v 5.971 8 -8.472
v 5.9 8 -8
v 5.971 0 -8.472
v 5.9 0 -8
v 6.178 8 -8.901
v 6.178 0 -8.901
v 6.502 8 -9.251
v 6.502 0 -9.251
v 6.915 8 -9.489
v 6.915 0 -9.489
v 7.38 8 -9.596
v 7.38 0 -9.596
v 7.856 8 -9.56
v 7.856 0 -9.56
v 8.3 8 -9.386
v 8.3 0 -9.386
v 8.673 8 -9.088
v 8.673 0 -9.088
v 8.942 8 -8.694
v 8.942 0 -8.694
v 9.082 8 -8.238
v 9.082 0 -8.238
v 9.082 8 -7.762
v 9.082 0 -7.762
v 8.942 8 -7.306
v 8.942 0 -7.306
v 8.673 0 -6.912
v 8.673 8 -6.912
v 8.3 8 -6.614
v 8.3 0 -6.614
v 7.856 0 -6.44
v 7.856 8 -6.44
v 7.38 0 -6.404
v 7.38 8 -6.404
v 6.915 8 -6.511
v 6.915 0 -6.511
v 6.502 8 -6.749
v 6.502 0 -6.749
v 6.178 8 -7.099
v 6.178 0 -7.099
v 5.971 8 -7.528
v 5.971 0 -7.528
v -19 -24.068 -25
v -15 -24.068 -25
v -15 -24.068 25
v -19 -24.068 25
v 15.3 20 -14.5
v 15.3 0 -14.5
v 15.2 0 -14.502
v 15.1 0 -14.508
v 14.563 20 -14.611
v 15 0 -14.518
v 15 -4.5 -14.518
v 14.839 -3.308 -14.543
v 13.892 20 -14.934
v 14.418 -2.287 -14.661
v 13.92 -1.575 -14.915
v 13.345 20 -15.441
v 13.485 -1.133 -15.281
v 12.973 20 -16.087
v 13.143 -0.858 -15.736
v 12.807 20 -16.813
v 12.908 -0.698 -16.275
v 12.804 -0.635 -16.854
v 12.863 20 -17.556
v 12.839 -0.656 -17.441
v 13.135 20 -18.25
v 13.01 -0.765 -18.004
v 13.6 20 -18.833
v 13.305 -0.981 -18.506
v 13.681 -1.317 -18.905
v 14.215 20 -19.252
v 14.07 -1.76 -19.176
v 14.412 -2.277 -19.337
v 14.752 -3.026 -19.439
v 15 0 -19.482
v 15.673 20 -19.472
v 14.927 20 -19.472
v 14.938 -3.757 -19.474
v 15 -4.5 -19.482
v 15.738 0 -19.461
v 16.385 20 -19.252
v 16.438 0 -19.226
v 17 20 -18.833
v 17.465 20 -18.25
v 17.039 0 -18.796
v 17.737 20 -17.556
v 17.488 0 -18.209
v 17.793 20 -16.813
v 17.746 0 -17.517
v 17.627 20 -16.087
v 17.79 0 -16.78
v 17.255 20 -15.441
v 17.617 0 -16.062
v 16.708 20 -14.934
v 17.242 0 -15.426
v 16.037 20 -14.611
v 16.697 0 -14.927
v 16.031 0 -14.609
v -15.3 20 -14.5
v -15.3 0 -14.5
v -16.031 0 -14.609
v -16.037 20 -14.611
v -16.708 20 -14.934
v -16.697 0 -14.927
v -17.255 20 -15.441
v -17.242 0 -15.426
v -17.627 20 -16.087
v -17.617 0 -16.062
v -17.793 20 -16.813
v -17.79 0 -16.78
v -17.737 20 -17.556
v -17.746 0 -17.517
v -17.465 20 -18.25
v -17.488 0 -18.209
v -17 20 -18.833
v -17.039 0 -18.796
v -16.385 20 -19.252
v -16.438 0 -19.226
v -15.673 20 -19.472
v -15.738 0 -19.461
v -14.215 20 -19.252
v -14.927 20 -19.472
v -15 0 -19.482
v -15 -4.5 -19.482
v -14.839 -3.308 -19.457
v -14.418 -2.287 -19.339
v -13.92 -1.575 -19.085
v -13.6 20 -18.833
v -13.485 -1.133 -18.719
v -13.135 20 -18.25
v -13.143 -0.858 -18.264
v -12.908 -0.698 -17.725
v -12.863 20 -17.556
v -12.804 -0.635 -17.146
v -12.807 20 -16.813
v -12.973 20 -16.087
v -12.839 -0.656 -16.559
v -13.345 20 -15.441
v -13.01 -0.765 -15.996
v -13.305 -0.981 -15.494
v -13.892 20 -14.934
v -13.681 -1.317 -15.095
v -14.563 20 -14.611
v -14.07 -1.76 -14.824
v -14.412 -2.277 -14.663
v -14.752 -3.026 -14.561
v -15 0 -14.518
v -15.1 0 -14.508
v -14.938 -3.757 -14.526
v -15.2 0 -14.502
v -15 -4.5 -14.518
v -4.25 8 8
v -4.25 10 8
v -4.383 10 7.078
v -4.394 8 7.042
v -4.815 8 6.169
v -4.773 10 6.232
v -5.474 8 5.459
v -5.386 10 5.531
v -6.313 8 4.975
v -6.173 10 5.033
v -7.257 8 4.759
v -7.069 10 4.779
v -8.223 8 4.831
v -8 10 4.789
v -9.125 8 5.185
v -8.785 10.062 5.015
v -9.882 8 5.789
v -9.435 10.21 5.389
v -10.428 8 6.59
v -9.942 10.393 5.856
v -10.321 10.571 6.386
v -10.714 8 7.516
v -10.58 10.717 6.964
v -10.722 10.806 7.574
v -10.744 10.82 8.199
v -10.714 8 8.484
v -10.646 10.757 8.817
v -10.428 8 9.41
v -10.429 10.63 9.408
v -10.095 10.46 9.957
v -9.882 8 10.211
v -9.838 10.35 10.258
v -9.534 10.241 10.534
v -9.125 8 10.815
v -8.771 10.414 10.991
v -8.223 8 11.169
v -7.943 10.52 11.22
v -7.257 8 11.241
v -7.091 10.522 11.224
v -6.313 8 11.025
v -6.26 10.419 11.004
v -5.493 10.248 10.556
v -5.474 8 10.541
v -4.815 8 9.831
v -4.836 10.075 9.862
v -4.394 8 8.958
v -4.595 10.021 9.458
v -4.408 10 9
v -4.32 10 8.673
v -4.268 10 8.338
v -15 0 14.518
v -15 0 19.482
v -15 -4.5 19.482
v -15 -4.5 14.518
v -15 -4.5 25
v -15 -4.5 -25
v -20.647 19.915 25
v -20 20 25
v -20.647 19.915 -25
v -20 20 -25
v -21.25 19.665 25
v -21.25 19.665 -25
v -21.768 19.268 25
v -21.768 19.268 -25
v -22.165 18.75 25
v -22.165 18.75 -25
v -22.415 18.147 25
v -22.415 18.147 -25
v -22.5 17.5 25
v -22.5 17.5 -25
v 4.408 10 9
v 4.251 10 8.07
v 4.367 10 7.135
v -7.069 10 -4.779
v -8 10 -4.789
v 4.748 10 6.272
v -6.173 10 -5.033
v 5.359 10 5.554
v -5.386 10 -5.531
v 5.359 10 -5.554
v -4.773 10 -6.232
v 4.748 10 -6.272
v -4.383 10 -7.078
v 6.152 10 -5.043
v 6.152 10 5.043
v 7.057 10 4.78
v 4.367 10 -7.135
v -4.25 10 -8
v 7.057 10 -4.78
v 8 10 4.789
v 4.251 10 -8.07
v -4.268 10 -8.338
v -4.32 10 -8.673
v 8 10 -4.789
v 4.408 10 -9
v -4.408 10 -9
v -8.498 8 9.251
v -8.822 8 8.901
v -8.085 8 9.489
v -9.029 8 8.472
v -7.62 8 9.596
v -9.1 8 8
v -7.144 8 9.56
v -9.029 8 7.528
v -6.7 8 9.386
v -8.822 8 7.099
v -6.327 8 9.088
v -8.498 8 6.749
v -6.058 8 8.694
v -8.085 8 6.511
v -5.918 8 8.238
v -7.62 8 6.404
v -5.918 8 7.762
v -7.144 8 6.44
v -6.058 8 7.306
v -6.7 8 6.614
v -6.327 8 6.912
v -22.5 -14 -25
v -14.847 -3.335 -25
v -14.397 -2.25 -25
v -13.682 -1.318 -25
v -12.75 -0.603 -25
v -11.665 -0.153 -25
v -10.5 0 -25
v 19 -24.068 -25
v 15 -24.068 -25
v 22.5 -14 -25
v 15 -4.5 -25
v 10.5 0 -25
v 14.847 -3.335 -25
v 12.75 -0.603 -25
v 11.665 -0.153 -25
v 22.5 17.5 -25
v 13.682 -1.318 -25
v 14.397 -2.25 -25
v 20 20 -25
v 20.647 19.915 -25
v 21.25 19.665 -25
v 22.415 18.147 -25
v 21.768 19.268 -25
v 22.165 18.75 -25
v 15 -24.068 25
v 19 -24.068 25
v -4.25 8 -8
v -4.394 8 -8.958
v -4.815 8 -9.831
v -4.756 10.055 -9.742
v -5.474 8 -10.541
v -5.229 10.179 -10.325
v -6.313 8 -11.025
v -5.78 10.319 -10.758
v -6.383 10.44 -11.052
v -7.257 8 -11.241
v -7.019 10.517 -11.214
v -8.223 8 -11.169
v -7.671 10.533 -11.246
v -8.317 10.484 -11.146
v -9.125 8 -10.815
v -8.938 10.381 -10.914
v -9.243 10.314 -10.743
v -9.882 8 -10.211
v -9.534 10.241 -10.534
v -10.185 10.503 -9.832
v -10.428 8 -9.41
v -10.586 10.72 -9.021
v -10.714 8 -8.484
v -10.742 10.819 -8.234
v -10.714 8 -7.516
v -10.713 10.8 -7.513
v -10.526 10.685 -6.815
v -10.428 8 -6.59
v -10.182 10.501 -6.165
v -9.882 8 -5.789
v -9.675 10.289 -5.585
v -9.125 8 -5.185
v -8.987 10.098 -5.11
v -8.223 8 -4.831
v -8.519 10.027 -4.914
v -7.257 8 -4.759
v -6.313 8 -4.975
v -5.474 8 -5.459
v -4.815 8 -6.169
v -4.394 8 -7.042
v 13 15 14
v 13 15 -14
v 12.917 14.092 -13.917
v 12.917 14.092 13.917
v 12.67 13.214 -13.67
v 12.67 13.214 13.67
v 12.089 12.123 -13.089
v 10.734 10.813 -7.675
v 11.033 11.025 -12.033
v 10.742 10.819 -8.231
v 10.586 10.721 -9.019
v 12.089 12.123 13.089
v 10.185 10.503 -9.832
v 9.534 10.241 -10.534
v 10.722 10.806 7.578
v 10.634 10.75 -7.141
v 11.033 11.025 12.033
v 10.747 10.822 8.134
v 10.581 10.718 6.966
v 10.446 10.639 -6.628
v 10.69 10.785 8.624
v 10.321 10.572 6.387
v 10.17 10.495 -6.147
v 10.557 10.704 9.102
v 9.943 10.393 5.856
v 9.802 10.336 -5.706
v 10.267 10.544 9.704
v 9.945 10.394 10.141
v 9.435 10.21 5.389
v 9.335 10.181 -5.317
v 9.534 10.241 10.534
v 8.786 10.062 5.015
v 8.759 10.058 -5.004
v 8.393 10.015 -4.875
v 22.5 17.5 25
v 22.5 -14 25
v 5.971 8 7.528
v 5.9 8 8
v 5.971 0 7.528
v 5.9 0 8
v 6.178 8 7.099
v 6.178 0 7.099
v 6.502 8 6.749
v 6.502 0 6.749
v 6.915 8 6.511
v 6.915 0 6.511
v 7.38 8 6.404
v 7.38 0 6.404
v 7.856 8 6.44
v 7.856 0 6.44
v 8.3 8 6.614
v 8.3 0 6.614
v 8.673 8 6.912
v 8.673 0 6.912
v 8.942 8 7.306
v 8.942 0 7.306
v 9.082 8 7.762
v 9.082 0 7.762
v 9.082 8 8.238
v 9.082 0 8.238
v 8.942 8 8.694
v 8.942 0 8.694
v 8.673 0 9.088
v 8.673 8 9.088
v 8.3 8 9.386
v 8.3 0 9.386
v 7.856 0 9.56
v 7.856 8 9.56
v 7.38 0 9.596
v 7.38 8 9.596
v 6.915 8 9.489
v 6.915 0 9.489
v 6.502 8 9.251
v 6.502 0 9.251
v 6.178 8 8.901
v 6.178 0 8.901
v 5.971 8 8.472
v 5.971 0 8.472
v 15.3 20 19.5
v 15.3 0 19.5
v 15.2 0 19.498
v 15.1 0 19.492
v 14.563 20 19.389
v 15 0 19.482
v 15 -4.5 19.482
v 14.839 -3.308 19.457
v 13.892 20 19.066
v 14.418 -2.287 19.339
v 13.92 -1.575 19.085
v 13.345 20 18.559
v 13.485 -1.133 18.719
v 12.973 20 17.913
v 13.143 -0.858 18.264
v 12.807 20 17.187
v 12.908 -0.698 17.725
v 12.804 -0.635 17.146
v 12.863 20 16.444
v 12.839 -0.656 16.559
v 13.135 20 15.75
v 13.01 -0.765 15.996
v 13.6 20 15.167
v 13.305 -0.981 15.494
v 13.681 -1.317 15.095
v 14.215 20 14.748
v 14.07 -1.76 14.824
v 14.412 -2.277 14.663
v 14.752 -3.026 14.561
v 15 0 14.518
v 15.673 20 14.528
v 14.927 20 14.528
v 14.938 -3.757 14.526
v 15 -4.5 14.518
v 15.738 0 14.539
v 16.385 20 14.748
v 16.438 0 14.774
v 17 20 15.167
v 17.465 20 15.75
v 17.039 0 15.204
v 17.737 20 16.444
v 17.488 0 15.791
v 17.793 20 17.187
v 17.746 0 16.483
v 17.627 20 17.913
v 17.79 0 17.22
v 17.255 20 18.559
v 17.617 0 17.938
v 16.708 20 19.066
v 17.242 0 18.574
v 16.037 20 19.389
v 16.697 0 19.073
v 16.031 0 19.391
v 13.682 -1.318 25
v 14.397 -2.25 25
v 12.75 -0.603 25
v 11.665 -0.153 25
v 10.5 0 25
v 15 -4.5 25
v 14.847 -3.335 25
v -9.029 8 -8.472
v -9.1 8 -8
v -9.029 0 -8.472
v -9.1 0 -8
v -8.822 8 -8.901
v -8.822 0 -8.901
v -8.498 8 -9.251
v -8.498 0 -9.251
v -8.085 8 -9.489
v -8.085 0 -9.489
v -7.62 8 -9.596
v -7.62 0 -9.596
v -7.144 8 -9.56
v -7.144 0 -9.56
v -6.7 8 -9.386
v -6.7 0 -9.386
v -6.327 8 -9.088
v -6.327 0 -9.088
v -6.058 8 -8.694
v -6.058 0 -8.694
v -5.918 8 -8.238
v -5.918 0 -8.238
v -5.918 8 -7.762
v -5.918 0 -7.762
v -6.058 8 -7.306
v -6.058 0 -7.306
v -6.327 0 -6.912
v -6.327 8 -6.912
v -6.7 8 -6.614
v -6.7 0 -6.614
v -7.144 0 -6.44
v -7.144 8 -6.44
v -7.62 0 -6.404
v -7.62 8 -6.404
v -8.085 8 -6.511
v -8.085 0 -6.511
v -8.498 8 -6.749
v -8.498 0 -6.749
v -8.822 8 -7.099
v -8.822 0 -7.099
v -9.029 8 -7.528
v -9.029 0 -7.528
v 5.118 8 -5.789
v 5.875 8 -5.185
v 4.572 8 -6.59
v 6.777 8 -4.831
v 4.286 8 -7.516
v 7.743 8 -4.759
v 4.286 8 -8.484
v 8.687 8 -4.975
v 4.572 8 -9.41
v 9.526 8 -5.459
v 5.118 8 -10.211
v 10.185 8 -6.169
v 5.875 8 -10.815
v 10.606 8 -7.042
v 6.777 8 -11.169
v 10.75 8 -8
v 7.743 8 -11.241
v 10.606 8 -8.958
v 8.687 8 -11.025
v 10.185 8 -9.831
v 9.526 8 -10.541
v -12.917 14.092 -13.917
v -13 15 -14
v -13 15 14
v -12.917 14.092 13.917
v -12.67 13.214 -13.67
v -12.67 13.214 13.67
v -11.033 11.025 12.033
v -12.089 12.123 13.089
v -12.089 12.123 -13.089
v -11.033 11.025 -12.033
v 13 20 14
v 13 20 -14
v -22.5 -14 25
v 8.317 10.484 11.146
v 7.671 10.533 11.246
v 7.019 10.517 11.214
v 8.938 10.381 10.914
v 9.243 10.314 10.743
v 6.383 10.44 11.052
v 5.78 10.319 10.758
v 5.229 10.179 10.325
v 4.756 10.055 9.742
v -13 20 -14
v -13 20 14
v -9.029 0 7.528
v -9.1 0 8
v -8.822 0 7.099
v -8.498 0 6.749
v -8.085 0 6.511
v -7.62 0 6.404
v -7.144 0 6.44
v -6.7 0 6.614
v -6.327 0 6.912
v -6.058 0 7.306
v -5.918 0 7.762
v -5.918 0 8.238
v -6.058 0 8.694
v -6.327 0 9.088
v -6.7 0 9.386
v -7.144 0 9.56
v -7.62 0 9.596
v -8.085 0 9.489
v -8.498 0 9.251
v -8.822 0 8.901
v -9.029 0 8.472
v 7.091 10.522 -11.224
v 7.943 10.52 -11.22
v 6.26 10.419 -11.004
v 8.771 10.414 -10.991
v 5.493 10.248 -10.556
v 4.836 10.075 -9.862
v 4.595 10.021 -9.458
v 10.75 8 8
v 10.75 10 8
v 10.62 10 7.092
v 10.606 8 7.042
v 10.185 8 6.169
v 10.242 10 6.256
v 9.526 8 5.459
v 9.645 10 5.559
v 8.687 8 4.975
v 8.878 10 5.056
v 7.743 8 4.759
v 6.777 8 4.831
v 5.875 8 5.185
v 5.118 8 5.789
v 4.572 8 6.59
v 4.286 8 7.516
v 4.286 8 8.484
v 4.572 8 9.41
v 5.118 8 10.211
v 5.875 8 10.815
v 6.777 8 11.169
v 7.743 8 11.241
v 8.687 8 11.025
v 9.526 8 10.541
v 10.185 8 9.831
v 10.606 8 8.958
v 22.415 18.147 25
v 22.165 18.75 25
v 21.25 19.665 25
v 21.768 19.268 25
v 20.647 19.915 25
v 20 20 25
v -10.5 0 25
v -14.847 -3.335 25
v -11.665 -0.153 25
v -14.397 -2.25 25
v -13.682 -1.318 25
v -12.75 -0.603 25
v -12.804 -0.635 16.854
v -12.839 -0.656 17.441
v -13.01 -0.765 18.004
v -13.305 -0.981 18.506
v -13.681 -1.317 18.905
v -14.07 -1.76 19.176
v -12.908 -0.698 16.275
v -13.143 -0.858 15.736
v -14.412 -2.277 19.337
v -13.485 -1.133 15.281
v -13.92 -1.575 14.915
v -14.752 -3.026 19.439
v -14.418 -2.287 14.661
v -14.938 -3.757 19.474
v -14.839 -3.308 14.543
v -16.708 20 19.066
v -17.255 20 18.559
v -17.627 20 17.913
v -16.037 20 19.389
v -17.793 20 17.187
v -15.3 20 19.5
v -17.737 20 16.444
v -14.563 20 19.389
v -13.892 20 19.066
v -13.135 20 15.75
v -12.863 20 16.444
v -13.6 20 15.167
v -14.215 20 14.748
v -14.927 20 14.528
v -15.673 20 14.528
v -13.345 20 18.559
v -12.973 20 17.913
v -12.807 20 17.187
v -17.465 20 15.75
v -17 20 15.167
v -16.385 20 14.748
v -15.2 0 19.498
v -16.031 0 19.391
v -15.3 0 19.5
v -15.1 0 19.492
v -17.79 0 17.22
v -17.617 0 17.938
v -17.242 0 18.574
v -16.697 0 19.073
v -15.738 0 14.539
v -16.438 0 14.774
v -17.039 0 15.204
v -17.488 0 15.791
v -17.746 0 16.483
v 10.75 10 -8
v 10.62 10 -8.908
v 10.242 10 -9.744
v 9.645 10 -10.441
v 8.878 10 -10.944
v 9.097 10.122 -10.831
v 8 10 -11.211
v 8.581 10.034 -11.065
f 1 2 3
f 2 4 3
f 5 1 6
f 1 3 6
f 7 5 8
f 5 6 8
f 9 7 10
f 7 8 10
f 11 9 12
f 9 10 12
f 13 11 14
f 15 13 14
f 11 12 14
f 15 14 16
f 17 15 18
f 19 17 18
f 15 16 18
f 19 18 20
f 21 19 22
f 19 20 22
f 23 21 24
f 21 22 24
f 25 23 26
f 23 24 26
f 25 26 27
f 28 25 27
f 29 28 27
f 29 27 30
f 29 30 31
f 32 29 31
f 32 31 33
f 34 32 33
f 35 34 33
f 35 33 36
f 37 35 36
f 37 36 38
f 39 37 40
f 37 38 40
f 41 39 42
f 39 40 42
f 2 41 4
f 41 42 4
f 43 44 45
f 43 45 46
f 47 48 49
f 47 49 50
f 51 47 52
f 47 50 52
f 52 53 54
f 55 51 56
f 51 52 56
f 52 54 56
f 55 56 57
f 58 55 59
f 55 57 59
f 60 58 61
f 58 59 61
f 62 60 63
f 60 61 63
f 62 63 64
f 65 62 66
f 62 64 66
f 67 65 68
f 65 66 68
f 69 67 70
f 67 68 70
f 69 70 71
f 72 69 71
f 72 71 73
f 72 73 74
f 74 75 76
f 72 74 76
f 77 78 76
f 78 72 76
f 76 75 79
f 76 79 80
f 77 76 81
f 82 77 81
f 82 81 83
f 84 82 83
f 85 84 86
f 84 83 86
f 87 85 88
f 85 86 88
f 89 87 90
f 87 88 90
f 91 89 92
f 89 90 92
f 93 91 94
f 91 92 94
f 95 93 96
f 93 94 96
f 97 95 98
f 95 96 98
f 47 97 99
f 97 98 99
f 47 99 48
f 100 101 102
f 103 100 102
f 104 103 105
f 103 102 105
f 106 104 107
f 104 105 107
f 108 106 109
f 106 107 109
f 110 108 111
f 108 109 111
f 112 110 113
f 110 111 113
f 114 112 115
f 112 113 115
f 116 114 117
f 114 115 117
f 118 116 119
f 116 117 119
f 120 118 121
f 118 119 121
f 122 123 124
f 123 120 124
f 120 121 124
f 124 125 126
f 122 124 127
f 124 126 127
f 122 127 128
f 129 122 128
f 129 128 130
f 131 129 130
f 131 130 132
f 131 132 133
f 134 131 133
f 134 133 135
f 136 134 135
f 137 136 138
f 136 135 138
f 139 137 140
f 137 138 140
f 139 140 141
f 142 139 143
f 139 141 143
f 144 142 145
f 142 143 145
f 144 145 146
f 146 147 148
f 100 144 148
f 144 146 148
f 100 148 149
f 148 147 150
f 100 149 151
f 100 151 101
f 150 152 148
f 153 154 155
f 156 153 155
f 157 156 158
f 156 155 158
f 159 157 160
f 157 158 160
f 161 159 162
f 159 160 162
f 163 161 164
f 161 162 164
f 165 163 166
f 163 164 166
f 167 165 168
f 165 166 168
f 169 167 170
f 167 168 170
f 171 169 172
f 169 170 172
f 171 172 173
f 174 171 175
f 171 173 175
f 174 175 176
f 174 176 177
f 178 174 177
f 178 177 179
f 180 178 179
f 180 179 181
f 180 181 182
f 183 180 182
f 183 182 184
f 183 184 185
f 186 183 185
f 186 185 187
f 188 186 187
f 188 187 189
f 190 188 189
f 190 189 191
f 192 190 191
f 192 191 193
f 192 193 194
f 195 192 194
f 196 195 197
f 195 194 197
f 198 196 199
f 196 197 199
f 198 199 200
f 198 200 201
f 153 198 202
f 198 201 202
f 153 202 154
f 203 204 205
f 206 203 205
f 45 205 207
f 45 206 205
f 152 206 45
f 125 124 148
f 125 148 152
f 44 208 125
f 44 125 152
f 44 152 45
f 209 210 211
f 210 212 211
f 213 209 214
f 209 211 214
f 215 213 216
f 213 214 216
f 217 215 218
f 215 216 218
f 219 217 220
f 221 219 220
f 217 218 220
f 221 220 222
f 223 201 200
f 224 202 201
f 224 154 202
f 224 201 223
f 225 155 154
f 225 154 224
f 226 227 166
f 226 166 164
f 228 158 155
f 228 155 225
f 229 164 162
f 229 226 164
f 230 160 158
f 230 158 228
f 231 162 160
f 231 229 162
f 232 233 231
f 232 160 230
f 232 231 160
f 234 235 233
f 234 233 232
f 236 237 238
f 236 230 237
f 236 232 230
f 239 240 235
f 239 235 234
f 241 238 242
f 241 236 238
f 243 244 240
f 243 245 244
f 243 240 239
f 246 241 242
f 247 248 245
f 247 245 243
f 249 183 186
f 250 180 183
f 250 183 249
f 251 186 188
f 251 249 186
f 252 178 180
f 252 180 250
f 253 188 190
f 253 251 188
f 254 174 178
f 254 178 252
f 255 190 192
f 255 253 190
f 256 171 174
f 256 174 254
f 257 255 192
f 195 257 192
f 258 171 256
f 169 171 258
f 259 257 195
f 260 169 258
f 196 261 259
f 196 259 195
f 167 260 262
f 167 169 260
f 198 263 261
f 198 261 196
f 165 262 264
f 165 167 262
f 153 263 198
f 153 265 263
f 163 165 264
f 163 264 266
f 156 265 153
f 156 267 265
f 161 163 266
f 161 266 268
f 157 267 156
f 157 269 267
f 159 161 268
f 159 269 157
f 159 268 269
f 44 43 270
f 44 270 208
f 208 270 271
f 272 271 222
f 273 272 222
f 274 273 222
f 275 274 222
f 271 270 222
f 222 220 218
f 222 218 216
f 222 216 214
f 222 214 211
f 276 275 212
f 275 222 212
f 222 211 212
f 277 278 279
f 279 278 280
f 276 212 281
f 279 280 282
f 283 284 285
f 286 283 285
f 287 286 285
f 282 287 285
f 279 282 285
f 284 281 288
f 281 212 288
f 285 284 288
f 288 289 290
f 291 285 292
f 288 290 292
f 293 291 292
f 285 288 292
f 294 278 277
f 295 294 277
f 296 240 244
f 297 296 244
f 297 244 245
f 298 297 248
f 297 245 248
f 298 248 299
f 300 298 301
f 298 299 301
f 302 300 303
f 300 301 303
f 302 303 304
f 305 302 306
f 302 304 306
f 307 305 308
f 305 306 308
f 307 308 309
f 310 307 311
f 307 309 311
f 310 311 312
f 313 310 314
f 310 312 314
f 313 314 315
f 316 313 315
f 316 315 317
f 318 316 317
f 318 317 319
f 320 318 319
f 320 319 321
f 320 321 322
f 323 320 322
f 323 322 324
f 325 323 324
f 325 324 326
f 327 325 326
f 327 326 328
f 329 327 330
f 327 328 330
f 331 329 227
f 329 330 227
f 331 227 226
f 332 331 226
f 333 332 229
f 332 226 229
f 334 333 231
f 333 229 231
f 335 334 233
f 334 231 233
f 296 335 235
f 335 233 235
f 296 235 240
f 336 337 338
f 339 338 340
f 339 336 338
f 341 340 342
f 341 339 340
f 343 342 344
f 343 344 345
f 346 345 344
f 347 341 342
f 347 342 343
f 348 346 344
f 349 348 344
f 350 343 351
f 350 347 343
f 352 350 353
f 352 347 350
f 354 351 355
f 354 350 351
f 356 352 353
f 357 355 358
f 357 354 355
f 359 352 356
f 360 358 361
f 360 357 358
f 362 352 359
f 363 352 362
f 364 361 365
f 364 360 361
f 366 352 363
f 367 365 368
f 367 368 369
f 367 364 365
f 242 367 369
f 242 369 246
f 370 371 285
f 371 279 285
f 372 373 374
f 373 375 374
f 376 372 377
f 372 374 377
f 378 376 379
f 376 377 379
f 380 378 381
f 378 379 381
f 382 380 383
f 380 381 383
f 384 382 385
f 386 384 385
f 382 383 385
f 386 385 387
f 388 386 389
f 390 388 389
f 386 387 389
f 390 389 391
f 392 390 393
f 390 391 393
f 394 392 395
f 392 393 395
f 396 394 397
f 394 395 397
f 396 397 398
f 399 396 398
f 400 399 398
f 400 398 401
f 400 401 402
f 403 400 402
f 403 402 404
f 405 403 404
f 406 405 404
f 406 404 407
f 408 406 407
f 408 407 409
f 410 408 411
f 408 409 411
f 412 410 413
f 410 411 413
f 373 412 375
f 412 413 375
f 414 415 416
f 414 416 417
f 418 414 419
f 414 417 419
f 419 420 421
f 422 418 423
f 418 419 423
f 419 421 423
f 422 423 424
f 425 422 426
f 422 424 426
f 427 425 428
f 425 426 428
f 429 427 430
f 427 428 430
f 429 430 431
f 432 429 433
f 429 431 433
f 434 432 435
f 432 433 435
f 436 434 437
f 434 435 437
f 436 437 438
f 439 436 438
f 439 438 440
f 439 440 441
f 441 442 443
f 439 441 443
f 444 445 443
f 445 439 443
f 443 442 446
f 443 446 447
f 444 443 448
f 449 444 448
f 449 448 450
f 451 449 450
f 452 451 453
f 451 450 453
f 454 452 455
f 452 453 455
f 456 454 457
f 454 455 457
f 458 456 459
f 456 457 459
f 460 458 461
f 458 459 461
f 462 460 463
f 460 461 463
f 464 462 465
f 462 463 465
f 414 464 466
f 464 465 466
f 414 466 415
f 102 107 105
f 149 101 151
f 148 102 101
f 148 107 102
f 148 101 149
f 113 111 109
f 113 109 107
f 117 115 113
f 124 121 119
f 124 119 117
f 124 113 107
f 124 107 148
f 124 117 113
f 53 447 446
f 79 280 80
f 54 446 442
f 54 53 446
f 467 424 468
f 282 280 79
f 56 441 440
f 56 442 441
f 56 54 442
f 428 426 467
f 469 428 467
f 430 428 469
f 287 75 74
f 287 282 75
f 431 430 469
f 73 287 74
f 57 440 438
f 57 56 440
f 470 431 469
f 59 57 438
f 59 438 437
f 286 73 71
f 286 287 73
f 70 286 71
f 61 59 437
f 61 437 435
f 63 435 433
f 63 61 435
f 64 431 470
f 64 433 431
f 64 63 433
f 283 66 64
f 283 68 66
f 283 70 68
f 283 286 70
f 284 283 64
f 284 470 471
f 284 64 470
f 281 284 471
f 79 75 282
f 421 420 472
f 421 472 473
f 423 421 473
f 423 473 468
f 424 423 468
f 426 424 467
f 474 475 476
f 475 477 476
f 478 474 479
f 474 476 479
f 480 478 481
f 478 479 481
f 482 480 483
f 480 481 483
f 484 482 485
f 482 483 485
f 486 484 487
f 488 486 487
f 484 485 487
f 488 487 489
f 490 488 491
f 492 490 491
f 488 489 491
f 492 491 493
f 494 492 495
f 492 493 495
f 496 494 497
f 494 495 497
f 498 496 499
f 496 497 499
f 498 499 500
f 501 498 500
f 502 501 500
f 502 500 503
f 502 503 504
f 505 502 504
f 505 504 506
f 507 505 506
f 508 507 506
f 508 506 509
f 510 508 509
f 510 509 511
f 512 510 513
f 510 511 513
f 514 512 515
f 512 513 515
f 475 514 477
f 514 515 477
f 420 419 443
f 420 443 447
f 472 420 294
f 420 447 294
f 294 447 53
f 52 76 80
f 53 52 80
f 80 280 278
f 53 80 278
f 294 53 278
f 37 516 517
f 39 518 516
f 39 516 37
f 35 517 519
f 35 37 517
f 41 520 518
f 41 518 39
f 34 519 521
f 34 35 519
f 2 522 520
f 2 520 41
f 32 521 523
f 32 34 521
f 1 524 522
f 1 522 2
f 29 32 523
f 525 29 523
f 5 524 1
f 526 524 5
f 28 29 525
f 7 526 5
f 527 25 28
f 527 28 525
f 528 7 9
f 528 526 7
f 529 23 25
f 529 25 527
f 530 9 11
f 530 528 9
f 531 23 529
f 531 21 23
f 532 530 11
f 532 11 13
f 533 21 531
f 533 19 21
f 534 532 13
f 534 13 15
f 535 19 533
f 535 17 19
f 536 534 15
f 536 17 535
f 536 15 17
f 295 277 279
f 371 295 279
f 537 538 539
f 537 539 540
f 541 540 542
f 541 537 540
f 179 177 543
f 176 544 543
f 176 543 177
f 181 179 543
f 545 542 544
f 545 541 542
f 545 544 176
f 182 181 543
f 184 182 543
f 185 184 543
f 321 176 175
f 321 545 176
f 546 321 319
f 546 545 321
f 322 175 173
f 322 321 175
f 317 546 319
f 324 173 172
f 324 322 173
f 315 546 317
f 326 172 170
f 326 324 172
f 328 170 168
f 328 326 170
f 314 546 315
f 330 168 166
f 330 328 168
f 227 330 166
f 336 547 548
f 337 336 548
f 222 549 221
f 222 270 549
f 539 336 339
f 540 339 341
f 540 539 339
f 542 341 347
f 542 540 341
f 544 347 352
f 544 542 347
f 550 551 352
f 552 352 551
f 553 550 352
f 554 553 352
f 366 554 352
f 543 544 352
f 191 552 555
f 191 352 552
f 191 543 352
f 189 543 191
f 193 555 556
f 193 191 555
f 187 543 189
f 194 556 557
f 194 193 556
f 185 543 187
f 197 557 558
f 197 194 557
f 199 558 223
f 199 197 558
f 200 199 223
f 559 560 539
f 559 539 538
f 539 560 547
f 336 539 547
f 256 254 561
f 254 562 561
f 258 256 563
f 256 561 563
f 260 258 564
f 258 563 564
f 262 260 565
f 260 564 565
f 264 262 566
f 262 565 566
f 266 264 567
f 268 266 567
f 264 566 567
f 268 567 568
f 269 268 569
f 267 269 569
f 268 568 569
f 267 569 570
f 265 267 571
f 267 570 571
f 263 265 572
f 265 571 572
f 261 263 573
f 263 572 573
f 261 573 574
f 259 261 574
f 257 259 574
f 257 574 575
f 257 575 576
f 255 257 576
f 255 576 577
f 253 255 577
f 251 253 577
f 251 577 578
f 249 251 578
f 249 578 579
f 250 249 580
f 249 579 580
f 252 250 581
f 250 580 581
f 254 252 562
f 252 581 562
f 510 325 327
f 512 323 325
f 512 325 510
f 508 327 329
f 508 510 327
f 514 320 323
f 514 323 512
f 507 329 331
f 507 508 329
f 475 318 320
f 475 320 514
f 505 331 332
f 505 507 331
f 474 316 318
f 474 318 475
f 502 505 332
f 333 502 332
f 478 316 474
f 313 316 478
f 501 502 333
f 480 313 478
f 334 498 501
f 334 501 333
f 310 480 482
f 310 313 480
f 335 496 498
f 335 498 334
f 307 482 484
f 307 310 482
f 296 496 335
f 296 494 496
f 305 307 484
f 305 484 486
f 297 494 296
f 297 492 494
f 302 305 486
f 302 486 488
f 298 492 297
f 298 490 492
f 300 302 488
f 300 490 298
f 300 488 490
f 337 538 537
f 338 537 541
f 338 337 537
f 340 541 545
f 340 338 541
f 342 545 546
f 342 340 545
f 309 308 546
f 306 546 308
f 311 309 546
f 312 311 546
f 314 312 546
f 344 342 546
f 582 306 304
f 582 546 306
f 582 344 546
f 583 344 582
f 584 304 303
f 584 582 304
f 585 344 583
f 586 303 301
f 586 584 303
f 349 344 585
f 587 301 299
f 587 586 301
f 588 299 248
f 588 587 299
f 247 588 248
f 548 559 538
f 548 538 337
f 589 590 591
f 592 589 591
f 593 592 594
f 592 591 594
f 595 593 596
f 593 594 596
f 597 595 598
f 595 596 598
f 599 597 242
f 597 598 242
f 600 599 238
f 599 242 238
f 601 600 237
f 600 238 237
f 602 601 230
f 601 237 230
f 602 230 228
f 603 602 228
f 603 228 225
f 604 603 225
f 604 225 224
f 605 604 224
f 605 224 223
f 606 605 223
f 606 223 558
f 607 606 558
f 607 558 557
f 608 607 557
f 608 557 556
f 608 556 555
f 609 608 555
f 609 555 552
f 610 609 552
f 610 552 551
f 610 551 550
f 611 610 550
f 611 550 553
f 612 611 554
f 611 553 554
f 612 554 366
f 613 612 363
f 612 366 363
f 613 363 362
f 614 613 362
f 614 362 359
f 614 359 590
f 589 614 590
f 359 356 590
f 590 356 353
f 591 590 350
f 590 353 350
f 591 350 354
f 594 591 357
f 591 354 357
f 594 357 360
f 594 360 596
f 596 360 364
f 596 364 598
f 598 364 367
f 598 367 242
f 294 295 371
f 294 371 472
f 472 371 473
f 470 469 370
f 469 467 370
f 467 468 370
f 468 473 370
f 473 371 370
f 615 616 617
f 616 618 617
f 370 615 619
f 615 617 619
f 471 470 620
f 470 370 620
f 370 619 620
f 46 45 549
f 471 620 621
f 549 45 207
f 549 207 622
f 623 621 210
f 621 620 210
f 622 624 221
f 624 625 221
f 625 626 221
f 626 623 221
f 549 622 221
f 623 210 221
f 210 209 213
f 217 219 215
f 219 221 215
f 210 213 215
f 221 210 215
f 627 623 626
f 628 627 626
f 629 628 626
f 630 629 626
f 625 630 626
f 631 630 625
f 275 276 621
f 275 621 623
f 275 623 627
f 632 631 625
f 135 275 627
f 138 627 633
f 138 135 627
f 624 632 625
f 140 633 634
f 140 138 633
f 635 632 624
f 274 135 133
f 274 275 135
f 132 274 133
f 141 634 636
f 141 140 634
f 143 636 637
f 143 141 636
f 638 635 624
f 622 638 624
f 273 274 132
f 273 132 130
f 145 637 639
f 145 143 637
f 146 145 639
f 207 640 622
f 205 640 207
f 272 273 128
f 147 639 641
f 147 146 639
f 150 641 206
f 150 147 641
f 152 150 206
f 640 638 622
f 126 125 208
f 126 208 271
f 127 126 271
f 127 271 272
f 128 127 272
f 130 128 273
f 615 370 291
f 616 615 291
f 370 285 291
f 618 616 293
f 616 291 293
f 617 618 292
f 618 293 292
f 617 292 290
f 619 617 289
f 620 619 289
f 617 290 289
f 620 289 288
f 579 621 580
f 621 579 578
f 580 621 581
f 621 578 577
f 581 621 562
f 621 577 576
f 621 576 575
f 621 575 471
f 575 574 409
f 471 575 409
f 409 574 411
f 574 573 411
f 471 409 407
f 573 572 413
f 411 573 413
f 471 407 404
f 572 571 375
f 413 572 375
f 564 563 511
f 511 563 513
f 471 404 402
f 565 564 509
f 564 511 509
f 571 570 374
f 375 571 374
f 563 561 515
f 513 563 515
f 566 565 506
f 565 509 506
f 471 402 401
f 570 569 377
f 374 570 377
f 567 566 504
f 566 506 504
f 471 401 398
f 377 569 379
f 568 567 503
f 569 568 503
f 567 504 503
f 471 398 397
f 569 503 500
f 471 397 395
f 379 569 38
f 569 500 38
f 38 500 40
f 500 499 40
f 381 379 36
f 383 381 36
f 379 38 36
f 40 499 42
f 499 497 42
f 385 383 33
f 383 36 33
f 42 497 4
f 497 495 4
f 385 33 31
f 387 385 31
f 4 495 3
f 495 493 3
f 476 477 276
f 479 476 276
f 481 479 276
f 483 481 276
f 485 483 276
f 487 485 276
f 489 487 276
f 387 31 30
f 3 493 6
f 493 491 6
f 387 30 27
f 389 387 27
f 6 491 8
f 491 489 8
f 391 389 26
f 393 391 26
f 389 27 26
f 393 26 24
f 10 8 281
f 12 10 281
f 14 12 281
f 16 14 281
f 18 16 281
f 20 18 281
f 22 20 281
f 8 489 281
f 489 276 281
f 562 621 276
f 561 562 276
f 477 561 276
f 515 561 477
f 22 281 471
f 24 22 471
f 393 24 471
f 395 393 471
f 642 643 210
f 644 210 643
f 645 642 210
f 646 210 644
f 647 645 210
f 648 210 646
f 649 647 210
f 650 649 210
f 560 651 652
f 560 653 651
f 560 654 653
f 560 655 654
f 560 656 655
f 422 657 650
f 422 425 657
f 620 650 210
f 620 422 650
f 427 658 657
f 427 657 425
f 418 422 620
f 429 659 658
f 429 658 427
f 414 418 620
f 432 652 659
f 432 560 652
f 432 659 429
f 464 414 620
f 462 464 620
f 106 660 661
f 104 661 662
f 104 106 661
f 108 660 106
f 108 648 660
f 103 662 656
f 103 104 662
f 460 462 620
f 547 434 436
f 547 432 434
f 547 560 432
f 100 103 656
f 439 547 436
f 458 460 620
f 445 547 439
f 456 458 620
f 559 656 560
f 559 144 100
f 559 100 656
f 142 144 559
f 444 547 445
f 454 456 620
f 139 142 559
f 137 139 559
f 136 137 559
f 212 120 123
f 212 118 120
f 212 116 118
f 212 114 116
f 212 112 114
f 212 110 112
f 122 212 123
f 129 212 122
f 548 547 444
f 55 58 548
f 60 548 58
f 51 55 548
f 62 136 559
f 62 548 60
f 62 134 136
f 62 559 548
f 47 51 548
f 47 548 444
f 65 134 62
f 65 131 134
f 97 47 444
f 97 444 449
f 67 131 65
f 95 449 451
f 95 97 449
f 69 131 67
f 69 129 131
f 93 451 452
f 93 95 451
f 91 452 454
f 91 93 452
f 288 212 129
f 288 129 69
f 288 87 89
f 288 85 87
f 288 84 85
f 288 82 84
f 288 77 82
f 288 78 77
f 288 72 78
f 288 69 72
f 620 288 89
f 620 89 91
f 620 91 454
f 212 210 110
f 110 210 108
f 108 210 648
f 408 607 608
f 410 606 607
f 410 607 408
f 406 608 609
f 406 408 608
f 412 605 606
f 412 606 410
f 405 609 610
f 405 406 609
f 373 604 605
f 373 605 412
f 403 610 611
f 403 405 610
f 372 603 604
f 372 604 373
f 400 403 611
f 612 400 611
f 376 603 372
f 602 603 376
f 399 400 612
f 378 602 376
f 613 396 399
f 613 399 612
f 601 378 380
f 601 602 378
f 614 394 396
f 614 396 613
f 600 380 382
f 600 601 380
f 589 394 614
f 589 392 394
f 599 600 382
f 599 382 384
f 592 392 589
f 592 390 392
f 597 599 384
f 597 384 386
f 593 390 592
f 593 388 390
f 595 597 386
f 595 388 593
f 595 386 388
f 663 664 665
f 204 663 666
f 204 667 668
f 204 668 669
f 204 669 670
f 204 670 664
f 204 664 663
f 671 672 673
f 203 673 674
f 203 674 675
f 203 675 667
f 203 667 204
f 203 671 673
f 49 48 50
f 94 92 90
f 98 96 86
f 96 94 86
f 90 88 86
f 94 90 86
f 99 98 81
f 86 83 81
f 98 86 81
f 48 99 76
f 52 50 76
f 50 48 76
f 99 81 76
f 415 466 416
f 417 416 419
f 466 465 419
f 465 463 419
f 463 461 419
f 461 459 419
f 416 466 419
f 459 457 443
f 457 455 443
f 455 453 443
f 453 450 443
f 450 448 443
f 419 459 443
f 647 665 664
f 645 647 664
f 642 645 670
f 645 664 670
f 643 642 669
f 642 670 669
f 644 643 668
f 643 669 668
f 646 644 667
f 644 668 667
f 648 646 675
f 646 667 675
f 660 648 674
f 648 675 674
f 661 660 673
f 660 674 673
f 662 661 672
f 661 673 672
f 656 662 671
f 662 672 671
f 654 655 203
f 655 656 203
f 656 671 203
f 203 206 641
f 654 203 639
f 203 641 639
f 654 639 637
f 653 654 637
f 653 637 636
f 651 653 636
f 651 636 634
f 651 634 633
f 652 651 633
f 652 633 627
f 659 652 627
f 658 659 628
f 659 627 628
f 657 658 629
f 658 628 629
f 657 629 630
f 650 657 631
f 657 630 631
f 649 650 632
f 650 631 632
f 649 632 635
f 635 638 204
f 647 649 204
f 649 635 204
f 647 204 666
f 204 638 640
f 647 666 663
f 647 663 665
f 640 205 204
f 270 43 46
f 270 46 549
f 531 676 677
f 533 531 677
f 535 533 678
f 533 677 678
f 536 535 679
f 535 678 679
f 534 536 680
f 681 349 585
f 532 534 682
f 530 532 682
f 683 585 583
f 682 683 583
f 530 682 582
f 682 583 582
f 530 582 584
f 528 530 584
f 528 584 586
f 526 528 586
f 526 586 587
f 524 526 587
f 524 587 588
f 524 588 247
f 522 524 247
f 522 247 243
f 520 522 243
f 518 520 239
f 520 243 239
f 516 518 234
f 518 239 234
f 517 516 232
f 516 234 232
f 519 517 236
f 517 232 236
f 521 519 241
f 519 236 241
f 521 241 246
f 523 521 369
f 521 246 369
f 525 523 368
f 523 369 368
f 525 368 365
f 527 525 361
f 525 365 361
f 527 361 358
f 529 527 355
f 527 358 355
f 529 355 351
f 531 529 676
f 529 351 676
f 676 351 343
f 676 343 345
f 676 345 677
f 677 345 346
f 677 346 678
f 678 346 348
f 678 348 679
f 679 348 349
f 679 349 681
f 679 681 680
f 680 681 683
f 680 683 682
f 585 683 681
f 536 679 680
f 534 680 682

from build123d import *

# Parameters (mm, degrees)
SKETCH1_W                                            = 45
SKETCH1_H                                            = 50
SKETCH1_R                                            = 1.5
SKETCH1_R_2                                          = 2.5
BOSS_EXTRUDE1_DEPTH                                  = 20
SKETCH3_W                                            = 26
SKETCH3_H                                            = 28
CUT_EXTRUDE1_DEPTH                                   = 10
REFRENTADO_PARA_TORNILLO_CON_CABEZA_PLAN_D           = 3.2
REFRENTADO_PARA_TORNILLO_CON_CABEZA_PLAN_CBORE_D     = 6.5
REFRENTADO_PARA_TORNILLO_CON_CABEZA_PLAN_CBORE_DEPTH = 2
FILLET4_R                                            = 5
BOSS_EXTRUDE4_DEPTH                                  = 50
FILLET5_R                                            = 4.5
FILLET6_R                                            = 2.5


with BuildPart() as part:
    # Sketch1 → Boss-Extrude1 (new body)
    with BuildSketch(Plane(origin=(0, 0, 0), x_dir=(1, 0, 0), z_dir=(0, 1, 0))):
        Rectangle(SKETCH1_W, SKETCH1_H)
        with Locations(Location((-7.5, 8, 0), (0, 0, 270))):
            Circle(SKETCH1_R, mode=Mode.SUBTRACT)
        with Locations(Location((7.5, 8, 0), (0, 0, 270))):
            Circle(SKETCH1_R, mode=Mode.SUBTRACT)
        with Locations(Location((7.5, -8, 0), (0, 0, 270))):
            Circle(SKETCH1_R, mode=Mode.SUBTRACT)
        with Locations(Location((-7.5, -8, 0), (0, 0, 270))):
            Circle(SKETCH1_R, mode=Mode.SUBTRACT)
        with Locations(Location((15.3, 17, 0), (0, 0, 270))):
            Circle(SKETCH1_R_2, mode=Mode.SUBTRACT)
        with Locations(Location((-15.3, 17, 0), (0, 0, 270))):
            Circle(SKETCH1_R_2, mode=Mode.SUBTRACT)
        with Locations(Location((-15.3, -17, 0), (0, 0, 270))):
            Circle(SKETCH1_R_2, mode=Mode.SUBTRACT)
        with Locations(Location((15.3, -17, 0), (0, 0, 270))):
            Circle(SKETCH1_R_2, mode=Mode.SUBTRACT)
    extrude(amount=BOSS_EXTRUDE1_DEPTH)

    # Sketch3 → Cut-Extrude1 (cut)
    with BuildSketch(Plane(origin=(0, 20, 0), x_dir=(1, 0, 0), z_dir=(0, 1, 0))):
        Rectangle(SKETCH3_W, SKETCH3_H)
    extrude(amount=-CUT_EXTRUDE1_DEPTH, mode=Mode.SUBTRACT)

    # Refrentado para tornillo con cabeza plana de M32 (through all)
    with Locations(Plane(origin=(0, 10, 0), x_dir=(1, 0, 0), z_dir=(0, 1, 0))):
        with Locations((-7.5, 8), (-7.5, -8), (7.5, -8), (7.5, 8)):
            CounterBoreHole(REFRENTADO_PARA_TORNILLO_CON_CABEZA_PLAN_D / 2, REFRENTADO_PARA_TORNILLO_CON_CABEZA_PLAN_CBORE_D / 2, REFRENTADO_PARA_TORNILLO_CON_CABEZA_PLAN_CBORE_DEPTH)

    # Fillet4
    # the kernel refuses this fillet: 5 mm, written as the material it adds along each edge
    with BuildSketch(Plane(origin=(13, 10, 14), x_dir=(0, 1, 0), z_dir=(0, 0, -1))) as fillet4_piece_1_section:
        with BuildLine():
            CenterArc((FILLET4_R, -FILLET4_R), FILLET4_R, 90, 90)
            Line((0, -FILLET4_R), (0, 0))
            Line((0, 0), (FILLET4_R, 0))
        make_face()
    fillet4_piece_1 = extrude(amount=28, mode=Mode.PRIVATE)
    fillet4_piece_1 = fillet4_piece_1 - Plane(origin=(7.5, 11.149497573, 8), x_dir=(1, 0, 0), z_dir=(0, 1, 0)) * Cylinder(3.25, 76, mode=Mode.PRIVATE)
    fillet4_piece_1 = fillet4_piece_1 - Plane(origin=(7.5, 11.149497573, -8), x_dir=(1, 0, 0), z_dir=(0, 1, 0)) * Cylinder(3.25, 76, mode=Mode.PRIVATE)
    add(fillet4_piece_1)
    with BuildSketch(Plane(origin=(-13, 10, 14), x_dir=(0, 1, 0), z_dir=(1, 0, 0))) as fillet4_piece_2_section:
        with BuildLine():
            CenterArc((FILLET4_R, -FILLET4_R), FILLET4_R, 90, 90)
            Line((0, -FILLET4_R), (0, 0))
            Line((0, 0), (FILLET4_R, 0))
        make_face()
    fillet4_piece_2 = extrude(amount=26, mode=Mode.PRIVATE)
    fillet4_piece_2 = fillet4_piece_2 - Plane(origin=(-7.5, 11.135296279, 8), x_dir=(1, 0, 0), z_dir=(0, 1, 0)) * Cylinder(3.25, 72, mode=Mode.PRIVATE)
    fillet4_piece_2 = fillet4_piece_2 - Plane(origin=(7.5, 11.135296279, 8), x_dir=(1, 0, 0), z_dir=(0, 1, 0)) * Cylinder(3.25, 72, mode=Mode.PRIVATE)
    add(fillet4_piece_2)
    with BuildSketch(Plane(origin=(-13, 10, -14), x_dir=(0, 1, 0), z_dir=(0, 0, 1))) as fillet4_piece_3_section:
        with BuildLine():
            CenterArc((FILLET4_R, -FILLET4_R), FILLET4_R, 90, 90)
            Line((0, -FILLET4_R), (0, 0))
            Line((0, 0), (FILLET4_R, 0))
        make_face()
    fillet4_piece_3 = extrude(amount=28, mode=Mode.PRIVATE)
    fillet4_piece_3 = fillet4_piece_3 - Plane(origin=(-7.5, 11.149494803, 8), x_dir=(1, 0, 0), z_dir=(0, 1, 0)) * Cylinder(3.25, 76, mode=Mode.PRIVATE)
    fillet4_piece_3 = fillet4_piece_3 - Plane(origin=(-7.5, 11.149494803, -8), x_dir=(1, 0, 0), z_dir=(0, 1, 0)) * Cylinder(3.25, 76, mode=Mode.PRIVATE)
    add(fillet4_piece_3)
    with BuildSketch(Plane(origin=(13, 10, -14), x_dir=(0, 1, 0), z_dir=(-1, 0, 0))) as fillet4_piece_4_section:
        with BuildLine():
            CenterArc((FILLET4_R, -FILLET4_R), FILLET4_R, 90, 90)
            Line((0, -FILLET4_R), (0, 0))
            Line((0, 0), (FILLET4_R, 0))
        make_face()
    fillet4_piece_4 = extrude(amount=26, mode=Mode.PRIVATE)
    fillet4_piece_4 = fillet4_piece_4 - Plane(origin=(-7.5, 11.135296279, -8), x_dir=(1, 0, 0), z_dir=(0, 1, 0)) * Cylinder(3.25, 72, mode=Mode.PRIVATE)
    fillet4_piece_4 = fillet4_piece_4 - Plane(origin=(7.5, 11.135296279, -8), x_dir=(1, 0, 0), z_dir=(0, 1, 0)) * Cylinder(3.25, 72, mode=Mode.PRIVATE)
    add(fillet4_piece_4)

    # Sketch10 → Boss-Extrude4 (add, through all)
    with BuildSketch(Plane(origin=(0, 0, -25), x_dir=(-1, 0, 0), z_dir=(0, 0, -1))):
        Polygon((-15, 0), (-15, -24.067665252), (-19, -24.067665252), (-22.5, -14), (-22.5, 0), align=None)
    boss_extrude4 = extrude(amount=-BOSS_EXTRUDE4_DEPTH)

    # Mirror1: Boss-Extrude4 across plane
    add(boss_extrude4.mirror(Plane(origin=(0, 0, 0), x_dir=(0, 0, 1), z_dir=(1, 0, 0))))

    # Fillet5
    # the kernel refuses this fillet: 4.5 mm, written as the material it adds along each edge
    with BuildSketch(Plane(origin=(15, 0, -25.768065271), x_dir=(-1, 0, 0), z_dir=(0, 0, 1))) as fillet5_piece_1_section:
        with BuildLine():
            CenterArc((FILLET5_R, FILLET5_R), FILLET5_R, 180, 90)
            Line((0, FILLET5_R), (0, 0))
            Line((0, 0), (FILLET5_R, 0))
        make_face()
    fillet5_piece_1 = extrude(amount=51.536130542, mode=Mode.PRIVATE)
    fillet5_piece_1 = split(fillet5_piece_1, bisect_by=Plane(origin=(13.936107491, -0.973119841, 25), z_dir=(0, 0, -1)), keep=Keep.TOP, mode=Mode.PRIVATE)
    fillet5_piece_1 = fillet5_piece_1 - Plane(origin=(15.3, -0.973119841, 17), x_dir=(0, 0, 1), z_dir=(0, -1, 0)) * Cylinder(2.5, 122, mode=Mode.PRIVATE)
    fillet5_piece_1 = fillet5_piece_1 - Plane(origin=(15.3, -0.973119841, -17), x_dir=(0, 0, 1), z_dir=(0, -1, 0)) * Cylinder(2.5, 122, mode=Mode.PRIVATE)
    fillet5_piece_1 = split(fillet5_piece_1, bisect_by=Plane(origin=(13.936107491, -0.973119841, -25), z_dir=(0, 0, 1)), keep=Keep.TOP, mode=Mode.PRIVATE)
    add(fillet5_piece_1)
    with BuildSketch(Plane(origin=(-15, 0, -25.768065271), x_dir=(1, 0, 0), z_dir=(0, 0, 1))) as fillet5_piece_2_section:
        with BuildLine():
            CenterArc((FILLET5_R, -FILLET5_R), FILLET5_R, 90, 90)
            Line((0, -FILLET5_R), (0, 0))
            Line((0, 0), (FILLET5_R, 0))
        make_face()
    fillet5_piece_2 = extrude(amount=51.536130542, mode=Mode.PRIVATE)
    fillet5_piece_2 = fillet5_piece_2 - Plane(origin=(-15.3, -0.973119841, -17), x_dir=(0, 0, 1), z_dir=(0, -1, 0)) * Cylinder(2.5, 122, mode=Mode.PRIVATE)
    fillet5_piece_2 = fillet5_piece_2 - Plane(origin=(-15.3, -0.973119841, 17), x_dir=(0, 0, 1), z_dir=(0, -1, 0)) * Cylinder(2.5, 122, mode=Mode.PRIVATE)
    fillet5_piece_2 = split(fillet5_piece_2, bisect_by=Plane(origin=(-13.936107491, -0.973119841, 25), z_dir=(0, 0, -1)), keep=Keep.TOP, mode=Mode.PRIVATE)
    fillet5_piece_2 = split(fillet5_piece_2, bisect_by=Plane(origin=(-13.936107491, -0.973119841, -25), z_dir=(0, 0, 1)), keep=Keep.TOP, mode=Mode.PRIVATE)
    add(fillet5_piece_2)

    # Fillet6
    fillet6_edges = [part.edges().sort_by_distance(p)[0] for p in [
        (-22.5, 20, 0),
        (22.5, 20, 0),
    ]]
    fillet(fillet6_edges, radius=FILLET6_R)


solid = part.part
